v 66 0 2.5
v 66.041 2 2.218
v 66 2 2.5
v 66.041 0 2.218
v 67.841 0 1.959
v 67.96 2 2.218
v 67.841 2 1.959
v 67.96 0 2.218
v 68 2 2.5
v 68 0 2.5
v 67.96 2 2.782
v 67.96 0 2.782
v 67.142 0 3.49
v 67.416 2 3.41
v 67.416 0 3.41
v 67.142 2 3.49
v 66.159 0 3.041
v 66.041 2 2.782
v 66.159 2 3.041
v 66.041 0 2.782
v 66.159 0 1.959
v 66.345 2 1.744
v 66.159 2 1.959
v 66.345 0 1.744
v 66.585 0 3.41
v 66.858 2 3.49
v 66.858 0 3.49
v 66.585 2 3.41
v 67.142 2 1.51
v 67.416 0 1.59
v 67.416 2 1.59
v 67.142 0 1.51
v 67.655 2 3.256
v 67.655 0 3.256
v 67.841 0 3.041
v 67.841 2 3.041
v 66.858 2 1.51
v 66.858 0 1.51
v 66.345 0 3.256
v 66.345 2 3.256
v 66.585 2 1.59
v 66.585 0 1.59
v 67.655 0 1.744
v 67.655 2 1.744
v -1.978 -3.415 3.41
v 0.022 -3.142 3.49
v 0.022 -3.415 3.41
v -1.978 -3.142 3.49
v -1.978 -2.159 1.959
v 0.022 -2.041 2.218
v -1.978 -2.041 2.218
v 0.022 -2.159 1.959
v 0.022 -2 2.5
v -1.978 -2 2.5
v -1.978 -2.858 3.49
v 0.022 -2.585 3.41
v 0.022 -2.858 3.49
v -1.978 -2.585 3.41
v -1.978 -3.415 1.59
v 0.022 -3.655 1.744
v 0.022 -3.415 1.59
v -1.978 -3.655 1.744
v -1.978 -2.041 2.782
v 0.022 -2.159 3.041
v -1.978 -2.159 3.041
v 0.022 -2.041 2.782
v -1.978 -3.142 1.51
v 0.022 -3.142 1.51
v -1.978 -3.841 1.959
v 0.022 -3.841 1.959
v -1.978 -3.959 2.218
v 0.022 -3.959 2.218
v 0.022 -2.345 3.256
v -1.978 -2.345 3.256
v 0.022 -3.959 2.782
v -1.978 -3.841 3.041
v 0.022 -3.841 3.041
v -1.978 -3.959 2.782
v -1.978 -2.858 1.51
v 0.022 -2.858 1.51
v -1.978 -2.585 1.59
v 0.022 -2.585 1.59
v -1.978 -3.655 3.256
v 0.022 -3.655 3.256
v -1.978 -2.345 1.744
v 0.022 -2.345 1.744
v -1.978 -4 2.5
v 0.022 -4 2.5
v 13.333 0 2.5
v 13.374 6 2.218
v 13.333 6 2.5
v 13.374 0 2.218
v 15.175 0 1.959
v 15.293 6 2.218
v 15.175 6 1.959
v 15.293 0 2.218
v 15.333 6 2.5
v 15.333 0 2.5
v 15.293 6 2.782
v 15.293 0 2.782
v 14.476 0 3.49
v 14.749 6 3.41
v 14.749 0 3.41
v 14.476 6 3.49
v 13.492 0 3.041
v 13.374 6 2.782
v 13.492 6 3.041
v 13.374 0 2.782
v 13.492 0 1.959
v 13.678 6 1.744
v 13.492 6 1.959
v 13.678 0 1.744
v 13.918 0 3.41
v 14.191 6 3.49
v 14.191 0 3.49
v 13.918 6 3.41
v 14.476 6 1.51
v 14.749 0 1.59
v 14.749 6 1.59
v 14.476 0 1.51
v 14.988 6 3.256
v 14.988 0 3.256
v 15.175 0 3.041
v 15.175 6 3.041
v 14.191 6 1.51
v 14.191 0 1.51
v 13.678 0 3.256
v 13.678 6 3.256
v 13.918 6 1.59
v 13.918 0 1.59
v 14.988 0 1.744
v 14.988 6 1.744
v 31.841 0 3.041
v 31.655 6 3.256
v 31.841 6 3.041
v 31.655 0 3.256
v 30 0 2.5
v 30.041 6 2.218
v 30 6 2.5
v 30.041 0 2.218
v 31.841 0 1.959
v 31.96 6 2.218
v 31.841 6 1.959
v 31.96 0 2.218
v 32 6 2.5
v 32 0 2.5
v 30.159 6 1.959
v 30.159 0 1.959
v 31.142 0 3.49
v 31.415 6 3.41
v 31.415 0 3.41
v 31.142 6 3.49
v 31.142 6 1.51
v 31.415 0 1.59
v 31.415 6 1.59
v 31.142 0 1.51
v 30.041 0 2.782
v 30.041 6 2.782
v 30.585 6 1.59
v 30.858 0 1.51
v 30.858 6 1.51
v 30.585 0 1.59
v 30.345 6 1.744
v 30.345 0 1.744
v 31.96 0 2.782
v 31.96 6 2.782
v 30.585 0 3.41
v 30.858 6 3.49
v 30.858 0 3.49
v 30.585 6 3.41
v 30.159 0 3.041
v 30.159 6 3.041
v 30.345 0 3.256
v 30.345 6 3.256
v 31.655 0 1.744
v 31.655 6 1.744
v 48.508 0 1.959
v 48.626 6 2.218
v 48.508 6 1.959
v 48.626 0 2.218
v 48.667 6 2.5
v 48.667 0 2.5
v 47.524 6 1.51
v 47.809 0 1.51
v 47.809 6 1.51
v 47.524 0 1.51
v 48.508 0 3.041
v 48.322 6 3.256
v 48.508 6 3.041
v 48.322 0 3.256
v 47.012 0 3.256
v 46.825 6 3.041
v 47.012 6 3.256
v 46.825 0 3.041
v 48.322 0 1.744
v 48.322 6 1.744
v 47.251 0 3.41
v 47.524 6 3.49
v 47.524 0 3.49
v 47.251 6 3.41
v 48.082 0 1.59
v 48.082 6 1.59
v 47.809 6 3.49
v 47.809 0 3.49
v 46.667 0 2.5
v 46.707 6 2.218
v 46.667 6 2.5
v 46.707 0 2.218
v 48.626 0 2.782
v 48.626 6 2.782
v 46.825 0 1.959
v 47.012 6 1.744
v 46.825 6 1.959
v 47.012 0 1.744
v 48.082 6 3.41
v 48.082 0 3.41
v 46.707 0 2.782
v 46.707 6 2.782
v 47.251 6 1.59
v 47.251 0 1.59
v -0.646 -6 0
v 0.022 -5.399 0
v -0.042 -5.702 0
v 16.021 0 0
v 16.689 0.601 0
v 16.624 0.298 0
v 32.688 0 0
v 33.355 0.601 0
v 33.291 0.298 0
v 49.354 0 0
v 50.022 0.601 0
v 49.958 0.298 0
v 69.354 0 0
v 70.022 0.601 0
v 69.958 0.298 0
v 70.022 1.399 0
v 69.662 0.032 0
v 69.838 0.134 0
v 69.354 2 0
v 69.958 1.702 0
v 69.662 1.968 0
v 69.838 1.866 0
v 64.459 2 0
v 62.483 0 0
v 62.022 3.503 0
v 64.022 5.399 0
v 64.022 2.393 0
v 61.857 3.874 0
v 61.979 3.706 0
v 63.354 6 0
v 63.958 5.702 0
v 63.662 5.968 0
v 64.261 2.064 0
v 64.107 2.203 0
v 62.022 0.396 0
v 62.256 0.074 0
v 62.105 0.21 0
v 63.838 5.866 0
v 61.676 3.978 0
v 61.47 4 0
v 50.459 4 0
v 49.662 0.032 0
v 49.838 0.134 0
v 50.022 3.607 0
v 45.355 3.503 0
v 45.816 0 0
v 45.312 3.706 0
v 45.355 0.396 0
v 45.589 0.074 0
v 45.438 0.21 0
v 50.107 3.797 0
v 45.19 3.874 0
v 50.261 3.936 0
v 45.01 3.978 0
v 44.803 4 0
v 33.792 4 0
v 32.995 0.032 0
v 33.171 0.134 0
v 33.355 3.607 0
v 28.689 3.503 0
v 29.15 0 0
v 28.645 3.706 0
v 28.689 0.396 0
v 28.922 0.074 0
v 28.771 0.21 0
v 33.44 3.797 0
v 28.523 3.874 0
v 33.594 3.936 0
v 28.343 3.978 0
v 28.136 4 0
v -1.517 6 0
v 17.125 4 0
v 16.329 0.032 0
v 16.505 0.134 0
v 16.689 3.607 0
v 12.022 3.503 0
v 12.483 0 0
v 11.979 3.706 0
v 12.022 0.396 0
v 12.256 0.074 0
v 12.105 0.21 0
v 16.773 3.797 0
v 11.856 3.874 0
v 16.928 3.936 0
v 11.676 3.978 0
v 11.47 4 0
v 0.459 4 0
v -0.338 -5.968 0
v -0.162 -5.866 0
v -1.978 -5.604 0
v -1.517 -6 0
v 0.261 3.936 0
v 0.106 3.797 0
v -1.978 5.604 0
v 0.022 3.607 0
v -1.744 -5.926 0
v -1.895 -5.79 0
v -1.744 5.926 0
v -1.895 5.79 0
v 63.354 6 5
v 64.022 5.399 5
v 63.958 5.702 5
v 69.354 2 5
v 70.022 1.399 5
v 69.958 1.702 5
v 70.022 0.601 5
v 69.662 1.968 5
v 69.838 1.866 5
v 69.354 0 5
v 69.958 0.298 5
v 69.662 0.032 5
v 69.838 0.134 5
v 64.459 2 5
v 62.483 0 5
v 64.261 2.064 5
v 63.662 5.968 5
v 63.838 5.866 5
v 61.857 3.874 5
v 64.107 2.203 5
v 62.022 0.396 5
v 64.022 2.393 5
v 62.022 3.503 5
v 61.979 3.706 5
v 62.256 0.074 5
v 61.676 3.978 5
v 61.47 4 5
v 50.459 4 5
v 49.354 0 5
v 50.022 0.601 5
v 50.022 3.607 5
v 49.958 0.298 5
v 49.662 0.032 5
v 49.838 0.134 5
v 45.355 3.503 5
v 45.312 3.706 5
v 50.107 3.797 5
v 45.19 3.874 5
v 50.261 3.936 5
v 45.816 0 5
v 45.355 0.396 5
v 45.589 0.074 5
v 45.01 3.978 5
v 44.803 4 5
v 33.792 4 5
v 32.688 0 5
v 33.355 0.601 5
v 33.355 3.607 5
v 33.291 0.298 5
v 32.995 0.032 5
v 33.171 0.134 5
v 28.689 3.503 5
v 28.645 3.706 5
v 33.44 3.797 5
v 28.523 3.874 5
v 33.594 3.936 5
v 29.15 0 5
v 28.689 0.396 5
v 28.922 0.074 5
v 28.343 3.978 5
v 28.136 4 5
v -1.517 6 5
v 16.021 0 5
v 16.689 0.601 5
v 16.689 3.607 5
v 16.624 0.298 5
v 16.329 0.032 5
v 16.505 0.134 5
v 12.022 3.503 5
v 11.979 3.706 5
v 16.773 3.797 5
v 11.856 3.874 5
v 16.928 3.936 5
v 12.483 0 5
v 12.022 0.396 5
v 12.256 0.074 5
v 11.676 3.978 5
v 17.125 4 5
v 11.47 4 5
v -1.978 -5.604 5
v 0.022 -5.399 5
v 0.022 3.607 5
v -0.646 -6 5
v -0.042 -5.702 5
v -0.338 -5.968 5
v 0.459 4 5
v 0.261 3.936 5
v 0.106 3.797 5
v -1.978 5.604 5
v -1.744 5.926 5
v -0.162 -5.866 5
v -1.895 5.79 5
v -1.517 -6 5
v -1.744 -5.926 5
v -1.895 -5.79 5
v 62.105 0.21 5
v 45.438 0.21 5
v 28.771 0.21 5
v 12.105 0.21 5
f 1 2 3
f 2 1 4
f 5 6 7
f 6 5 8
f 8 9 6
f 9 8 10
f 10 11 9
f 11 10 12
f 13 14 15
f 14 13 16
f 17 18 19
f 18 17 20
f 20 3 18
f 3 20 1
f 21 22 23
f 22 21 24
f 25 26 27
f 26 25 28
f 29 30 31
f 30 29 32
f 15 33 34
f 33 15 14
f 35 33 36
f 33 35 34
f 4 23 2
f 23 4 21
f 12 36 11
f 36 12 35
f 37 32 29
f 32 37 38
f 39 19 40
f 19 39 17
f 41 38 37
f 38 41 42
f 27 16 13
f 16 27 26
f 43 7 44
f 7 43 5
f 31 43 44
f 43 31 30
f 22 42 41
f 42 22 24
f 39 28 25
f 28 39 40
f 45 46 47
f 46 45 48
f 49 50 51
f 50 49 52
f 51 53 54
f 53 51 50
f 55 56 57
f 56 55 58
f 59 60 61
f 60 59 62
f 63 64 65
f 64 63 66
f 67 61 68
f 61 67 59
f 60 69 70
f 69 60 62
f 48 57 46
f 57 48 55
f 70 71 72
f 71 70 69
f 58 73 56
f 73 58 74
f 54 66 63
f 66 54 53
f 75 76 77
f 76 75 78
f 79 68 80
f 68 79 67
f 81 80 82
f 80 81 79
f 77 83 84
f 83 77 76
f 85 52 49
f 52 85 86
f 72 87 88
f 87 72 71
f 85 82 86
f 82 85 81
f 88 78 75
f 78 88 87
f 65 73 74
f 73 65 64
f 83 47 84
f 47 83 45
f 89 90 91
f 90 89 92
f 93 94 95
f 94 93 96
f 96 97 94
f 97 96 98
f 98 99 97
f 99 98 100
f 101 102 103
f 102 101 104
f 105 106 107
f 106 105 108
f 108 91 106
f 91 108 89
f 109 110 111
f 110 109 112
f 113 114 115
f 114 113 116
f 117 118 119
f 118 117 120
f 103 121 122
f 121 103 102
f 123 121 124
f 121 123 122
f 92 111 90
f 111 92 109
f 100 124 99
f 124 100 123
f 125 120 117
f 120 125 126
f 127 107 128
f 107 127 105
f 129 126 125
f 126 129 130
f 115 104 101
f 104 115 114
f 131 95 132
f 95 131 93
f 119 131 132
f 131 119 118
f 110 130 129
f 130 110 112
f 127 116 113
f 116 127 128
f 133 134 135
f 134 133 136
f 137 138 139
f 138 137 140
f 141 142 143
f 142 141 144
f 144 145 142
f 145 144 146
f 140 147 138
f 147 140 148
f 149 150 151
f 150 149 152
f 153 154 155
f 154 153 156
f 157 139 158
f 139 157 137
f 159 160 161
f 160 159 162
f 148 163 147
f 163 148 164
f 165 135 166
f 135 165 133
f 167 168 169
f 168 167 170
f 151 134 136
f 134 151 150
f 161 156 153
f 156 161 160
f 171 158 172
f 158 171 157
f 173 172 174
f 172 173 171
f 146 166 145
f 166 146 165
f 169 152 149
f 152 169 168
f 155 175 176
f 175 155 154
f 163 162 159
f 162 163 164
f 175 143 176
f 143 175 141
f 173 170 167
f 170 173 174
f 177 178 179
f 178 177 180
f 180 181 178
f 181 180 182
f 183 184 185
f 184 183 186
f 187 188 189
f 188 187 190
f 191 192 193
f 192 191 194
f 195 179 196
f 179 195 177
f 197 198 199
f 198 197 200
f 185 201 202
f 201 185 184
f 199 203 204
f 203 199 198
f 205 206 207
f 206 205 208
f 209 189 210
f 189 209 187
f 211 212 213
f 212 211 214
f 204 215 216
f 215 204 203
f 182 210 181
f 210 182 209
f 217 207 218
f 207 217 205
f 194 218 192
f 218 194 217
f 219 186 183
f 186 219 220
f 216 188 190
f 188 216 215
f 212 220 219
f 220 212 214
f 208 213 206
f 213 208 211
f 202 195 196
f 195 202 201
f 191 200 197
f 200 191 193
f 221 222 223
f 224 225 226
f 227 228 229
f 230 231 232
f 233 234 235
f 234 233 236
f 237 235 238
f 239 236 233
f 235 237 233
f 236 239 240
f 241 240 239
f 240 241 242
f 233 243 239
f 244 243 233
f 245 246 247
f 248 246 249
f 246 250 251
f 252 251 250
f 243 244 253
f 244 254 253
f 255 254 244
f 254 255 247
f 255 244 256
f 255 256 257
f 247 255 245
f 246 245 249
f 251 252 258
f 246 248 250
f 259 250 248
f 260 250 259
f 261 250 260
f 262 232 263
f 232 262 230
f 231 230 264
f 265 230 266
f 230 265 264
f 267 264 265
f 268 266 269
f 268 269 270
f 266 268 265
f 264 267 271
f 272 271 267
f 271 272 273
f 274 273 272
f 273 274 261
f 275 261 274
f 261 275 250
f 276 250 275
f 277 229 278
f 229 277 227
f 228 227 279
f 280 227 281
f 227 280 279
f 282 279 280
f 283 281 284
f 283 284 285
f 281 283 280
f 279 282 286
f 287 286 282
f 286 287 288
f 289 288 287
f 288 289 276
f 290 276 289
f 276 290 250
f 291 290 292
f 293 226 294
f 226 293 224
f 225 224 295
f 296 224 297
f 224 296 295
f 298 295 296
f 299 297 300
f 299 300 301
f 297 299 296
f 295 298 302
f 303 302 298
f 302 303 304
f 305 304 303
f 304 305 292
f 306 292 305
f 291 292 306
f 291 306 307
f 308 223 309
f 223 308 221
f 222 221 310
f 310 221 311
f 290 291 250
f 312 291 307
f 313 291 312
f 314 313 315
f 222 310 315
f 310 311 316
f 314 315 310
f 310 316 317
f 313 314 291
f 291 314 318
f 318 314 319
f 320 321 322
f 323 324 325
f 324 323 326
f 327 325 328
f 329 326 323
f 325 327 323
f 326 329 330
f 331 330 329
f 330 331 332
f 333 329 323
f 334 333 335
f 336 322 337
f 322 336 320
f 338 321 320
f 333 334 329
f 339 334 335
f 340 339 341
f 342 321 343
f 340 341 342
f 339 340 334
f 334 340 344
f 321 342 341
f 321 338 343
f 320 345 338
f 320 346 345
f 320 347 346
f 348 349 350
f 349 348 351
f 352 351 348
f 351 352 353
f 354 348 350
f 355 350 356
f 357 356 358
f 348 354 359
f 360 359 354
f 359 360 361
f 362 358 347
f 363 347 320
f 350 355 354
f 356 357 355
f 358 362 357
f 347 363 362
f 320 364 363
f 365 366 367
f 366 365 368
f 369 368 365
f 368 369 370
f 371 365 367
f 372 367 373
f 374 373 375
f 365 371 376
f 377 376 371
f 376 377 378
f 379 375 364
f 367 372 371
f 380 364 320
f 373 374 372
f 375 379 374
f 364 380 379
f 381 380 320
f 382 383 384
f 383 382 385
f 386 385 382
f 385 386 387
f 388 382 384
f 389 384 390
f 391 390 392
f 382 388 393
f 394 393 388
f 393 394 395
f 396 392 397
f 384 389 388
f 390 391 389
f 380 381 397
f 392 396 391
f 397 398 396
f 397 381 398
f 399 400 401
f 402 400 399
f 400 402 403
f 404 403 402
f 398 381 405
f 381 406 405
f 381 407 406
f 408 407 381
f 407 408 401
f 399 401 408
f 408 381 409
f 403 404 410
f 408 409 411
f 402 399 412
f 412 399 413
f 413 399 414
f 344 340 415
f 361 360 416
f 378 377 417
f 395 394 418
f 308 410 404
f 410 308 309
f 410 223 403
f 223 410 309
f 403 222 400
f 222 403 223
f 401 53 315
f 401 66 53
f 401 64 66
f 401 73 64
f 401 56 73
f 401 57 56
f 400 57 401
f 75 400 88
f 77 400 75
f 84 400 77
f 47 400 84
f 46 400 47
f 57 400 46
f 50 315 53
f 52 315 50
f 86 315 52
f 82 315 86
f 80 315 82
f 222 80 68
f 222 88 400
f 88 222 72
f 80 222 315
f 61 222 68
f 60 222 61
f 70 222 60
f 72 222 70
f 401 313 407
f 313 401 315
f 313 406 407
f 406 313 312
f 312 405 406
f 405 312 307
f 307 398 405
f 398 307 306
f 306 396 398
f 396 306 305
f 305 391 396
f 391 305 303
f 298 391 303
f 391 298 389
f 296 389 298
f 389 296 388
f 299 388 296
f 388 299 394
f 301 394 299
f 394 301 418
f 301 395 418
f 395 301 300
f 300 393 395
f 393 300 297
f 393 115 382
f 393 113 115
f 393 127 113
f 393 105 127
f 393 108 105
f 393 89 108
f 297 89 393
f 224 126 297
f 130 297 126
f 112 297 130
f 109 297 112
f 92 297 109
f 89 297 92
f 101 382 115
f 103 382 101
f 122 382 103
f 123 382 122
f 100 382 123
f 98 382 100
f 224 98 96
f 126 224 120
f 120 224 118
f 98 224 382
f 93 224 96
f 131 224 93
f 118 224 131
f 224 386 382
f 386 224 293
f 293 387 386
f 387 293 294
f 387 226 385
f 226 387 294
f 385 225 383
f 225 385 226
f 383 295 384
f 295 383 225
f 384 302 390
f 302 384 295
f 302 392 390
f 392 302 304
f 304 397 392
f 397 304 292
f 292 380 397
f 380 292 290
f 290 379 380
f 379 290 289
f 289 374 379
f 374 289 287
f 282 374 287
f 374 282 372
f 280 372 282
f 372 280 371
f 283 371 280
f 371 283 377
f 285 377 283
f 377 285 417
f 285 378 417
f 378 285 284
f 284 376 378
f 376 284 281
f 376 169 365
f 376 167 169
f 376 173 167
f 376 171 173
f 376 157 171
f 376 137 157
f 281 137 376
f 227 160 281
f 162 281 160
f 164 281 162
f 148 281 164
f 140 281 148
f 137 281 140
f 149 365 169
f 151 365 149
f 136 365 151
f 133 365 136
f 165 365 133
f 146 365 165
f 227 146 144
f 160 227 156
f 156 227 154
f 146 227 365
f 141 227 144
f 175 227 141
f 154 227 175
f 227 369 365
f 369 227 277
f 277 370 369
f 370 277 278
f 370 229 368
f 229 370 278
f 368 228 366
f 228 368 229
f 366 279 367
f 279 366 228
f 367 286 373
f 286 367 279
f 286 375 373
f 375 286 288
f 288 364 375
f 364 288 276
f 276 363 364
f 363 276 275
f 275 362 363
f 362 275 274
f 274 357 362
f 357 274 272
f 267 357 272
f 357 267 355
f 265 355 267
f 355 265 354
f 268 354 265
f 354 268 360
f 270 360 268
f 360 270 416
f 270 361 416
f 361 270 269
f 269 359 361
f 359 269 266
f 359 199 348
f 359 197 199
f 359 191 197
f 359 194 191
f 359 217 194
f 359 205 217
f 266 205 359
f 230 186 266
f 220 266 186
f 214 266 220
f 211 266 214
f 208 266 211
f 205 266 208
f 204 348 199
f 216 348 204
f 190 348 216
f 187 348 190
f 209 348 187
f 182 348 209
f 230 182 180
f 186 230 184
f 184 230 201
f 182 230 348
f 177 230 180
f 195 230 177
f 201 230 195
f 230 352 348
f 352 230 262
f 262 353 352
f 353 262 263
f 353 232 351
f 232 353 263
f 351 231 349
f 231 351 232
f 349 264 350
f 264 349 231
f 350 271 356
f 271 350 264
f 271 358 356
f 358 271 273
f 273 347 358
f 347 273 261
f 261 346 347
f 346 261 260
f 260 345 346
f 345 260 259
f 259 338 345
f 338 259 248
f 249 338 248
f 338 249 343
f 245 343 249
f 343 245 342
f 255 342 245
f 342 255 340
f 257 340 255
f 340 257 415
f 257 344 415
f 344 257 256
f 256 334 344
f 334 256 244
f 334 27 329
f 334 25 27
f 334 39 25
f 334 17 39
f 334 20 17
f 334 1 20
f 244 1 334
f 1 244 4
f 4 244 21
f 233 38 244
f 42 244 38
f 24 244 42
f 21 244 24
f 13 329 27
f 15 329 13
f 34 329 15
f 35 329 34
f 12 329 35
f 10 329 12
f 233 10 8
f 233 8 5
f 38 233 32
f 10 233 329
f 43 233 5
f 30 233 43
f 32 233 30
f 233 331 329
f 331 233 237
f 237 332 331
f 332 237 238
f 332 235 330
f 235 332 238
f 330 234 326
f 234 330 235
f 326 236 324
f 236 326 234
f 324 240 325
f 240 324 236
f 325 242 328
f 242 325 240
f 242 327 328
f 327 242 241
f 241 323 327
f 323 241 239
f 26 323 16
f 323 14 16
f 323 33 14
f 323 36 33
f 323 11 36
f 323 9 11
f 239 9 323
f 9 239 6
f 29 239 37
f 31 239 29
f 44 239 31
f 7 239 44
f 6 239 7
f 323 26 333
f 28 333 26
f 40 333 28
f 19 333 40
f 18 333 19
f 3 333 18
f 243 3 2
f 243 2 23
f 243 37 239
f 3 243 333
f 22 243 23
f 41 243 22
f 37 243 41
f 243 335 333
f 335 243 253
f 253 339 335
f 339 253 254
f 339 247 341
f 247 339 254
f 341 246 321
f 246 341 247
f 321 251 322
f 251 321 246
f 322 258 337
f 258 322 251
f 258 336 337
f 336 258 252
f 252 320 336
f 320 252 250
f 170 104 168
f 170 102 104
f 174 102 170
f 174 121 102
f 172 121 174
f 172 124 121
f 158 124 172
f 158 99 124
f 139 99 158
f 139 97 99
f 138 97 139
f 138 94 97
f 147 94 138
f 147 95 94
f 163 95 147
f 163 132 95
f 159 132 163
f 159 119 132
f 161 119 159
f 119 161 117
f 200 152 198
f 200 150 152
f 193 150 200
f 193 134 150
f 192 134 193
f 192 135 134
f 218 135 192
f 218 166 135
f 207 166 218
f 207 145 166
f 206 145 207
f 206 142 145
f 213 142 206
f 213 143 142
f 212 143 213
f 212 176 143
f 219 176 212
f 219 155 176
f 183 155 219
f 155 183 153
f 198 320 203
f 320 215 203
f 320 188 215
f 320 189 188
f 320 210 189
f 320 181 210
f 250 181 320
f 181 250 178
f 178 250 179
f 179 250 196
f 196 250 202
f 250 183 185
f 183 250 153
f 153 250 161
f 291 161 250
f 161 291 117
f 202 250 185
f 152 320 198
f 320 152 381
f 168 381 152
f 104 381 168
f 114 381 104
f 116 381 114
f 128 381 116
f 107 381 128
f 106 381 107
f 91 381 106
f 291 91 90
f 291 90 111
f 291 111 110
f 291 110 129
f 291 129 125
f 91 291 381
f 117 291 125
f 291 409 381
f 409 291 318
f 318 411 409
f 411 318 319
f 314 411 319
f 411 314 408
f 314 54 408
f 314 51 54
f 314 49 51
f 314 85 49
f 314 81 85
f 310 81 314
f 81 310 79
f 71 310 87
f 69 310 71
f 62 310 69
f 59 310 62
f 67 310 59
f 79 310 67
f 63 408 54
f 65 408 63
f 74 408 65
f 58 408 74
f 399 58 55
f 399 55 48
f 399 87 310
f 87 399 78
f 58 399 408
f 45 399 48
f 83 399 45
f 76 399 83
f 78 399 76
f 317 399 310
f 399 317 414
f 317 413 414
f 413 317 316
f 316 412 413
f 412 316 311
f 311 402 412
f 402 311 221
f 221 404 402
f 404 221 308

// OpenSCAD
//------------------------------------------------------------------
/*

Bracket for multiple LED strips

Based on https://www.thingiverse.com/thing:1308286 Thanks to deadsy, aka Jason Harris

Frank van der Hulst, 21 Nov 2017

*/
//------------------------------------------------------------------
/* [Global] */

/*[General]*/
// Width of one LED strip; 12mm for IP67 protected, 10mm for IP30
strip_width = 12;                    // [5:20]                   
// Spacing interval of strips in mm; default to the same spacing as LEDs on the strip
strip_spacing = 16.6667;             // [5:.1:50]             
// Thickness of one LED strip; 4mm is for IP67 protected, 2.5mm for IP30
strip_thickness = 4;                 // [1:.5:5]                    
// Width of bracket in mm; should be less than LED spacing, or one of the LEDs will be obscured
bracket_width = 5;				     // [2:20]			
// Thickness of the bracket wall (mm)
wall_thickness = 2;					// [1:.1:5]		
// Diameter of attachment holes (mm)
hole_diam = 2;						// [1:.5:10]			
// Size of lugs at the ends for attachment holes (mm). May be 0.
lug_size = 6;						// [0:15]					
// Number of strips for one bracket
num_strips = 4;						// [1:20]			
// Roundness of corners (mm); default is wall_thickness/4
fillet_size = .5;					// [.2:.1:2.5]
// Whether bottom lug is square to the strips or flush
bottom_shape = "square";		    	// [flush,square]
// Wire diameter (mm); May be 0. Default is 4
wire_diameter = 0;						// [0:8]			
// Whether there are holes between strips or not
holes_between_strips = "yes";		// [yes,no]

// Distance between strips
separator_thickness = strip_spacing - strip_width;		

difference() {
  bracket();
  
  if (bracket_width > hole_diam) {
	if (lug_size >= hole_diam) {
		holes();
	}
	if (holes_between_strips == "yes" && separator_thickness >= hole_diam) {
		for (str = [1:num_strips-1])
			translate([str * strip_spacing - separator_thickness/2, -epsilon, bracket_width/2])  
				rotate([-90,0,0])   
					cylinder(d=hole_diam, h=wall_thickness*13, $fn=facets(hole_diam/2));
	}
  }
}

//  color("blue") translate([strip_spacing - separator_thickness/2, -epsilon, bracket_width/2])  rotate([-90,0,0])   cylinder(d=hole_diam, h=wall_thickness*13, $fn=facets(hole_diam/2));

//------------------------------------------------------------------

module bracket() {
	// Strip separators... one less than number of strips
	dividers = [		
		for (str = [1:num_strips-1])
			for(i = [0:3]) 
				[strip_spacing*(num_strips-str) - (((i == 0) || (i == 1)) ? 0 : separator_thickness),
				((i == 1 || i == 2)) ? 0 : strip_thickness]
	];

	bottom_lug = [
		[0, strip_thickness],
		[0, 0],
		// Bottom end
		[bottom_shape == "square" ? 0 : (wire_diameter > 0 ? -wire_diameter-wall_thickness*2:0)-lug_size-wall_thickness, bottom_shape == "square" ? -lug_size : 0],
		[bottom_shape == "square" ? -wall_thickness : (wire_diameter > 0 ? -wire_diameter-wall_thickness*2:0)-lug_size-wall_thickness, bottom_shape == "square" ? -lug_size : wall_thickness],
	];
	// Cross-section of bracket
	points= concat(bottom_lug,
	[
		// Main wall, bottom end
		[-wall_thickness, wall_thickness],
		[-wall_thickness, wall_thickness + strip_thickness],
        // Top end
		[strip_spacing * num_strips - separator_thickness + wall_thickness, wall_thickness + strip_thickness],
		[strip_spacing * num_strips - separator_thickness + wall_thickness, wall_thickness],
		// Bottom end
		[lug_size + strip_spacing * num_strips - separator_thickness + wall_thickness, wall_thickness],
		[lug_size + strip_spacing * num_strips - separator_thickness + wall_thickness, 0],
		[strip_spacing * num_strips - separator_thickness, 0],
		[strip_spacing * num_strips - separator_thickness, strip_thickness],
	], dividers); 

    linear_extrude(height=bracket_width, convexity=2) {
        filleted(fillet_size) rounded(fillet_size) polygon(points=points);
    }
    
    // Wire attachment
    if (wire_diameter > 0) {
        linear_extrude(height=bracket_width, convexity=2) {
            translate([bottom_shape == "square" ? -wire_diameter/2-wall_thickness : -wire_diameter/2-wall_thickness, 
                       bottom_shape == "square" ? wall_thickness : wire_diameter/2 + wall_thickness]) {
                union() {
                    rotate(bottom_shape == "square" ? 90 : 0) polygon(points=[
                        [wire_diameter/2+wall_thickness,0],
                        [wire_diameter/2+wall_thickness,-wire_diameter/2-wall_thickness],
                        [-wire_diameter/2-wall_thickness,-wire_diameter/2-wall_thickness],[-wire_diameter/2-wall_thickness,0],
                        [-wire_diameter/2,0],[-wire_diameter/2,-wire_diameter/2],
                        [wire_diameter/2,-wire_diameter/2],[wire_diameter/2,wire_diameter/2]]);
                    difference() {
                        circle(d = wire_diameter+wall_thickness*2);
                        circle(d = wire_diameter);
                    }
                }
            }
        }
    }
}

module holes() {
  // Top hole
  translate([strip_spacing * num_strips  - separator_thickness + wall_thickness + lug_size/2,0,0]) hole();
  // Bottom hole
  if (bottom_shape == "square") {
	translate([0,-lug_size/2,0])   rotate([0,0,90]) hole();
  } else {
	translate([(wire_diameter > 0 ? -wire_diameter-wall_thickness*2:0)-wall_thickness-lug_size/2,0,0])   hole();
  }
}

module hole() {
  translate([0, -wall_thickness, bracket_width/2]) rotate([-90,0,0]) {
    cylinder(r=hole_diam/2, h=wall_thickness*3, $fn=facets(hole_diam/2));
  }
}

//------------------------------------------------------------------
// The remainder relates to filleting

// control the number of facets on cylinders
facet_epsilon = 0.01;
function facets(r) = 180 / acos(1 - (facet_epsilon / r));

// small tweak to avoid differencing artifacts
epsilon = 0.05;

//------------------------------------------------------------------
// rounded/filleted edges

module outset(d=1) {
  minkowski() {
    circle(r=d, $fn=facets(d));
    children(0);
  }
}

module inset(d=1) {
  render() inverse() outset(d=d) inverse() children(0);
}

module inverse() {
  difference() {
    square(1e5, center=true);
    children(0);
  }
}

module rounded(r=1) {
  outset(d=r) inset(d=r) children(0);
}

module filleted(r=1) {
  inset(d=r) render() outset(d=r) children(0);
}

//------------------------------------------------------------------
